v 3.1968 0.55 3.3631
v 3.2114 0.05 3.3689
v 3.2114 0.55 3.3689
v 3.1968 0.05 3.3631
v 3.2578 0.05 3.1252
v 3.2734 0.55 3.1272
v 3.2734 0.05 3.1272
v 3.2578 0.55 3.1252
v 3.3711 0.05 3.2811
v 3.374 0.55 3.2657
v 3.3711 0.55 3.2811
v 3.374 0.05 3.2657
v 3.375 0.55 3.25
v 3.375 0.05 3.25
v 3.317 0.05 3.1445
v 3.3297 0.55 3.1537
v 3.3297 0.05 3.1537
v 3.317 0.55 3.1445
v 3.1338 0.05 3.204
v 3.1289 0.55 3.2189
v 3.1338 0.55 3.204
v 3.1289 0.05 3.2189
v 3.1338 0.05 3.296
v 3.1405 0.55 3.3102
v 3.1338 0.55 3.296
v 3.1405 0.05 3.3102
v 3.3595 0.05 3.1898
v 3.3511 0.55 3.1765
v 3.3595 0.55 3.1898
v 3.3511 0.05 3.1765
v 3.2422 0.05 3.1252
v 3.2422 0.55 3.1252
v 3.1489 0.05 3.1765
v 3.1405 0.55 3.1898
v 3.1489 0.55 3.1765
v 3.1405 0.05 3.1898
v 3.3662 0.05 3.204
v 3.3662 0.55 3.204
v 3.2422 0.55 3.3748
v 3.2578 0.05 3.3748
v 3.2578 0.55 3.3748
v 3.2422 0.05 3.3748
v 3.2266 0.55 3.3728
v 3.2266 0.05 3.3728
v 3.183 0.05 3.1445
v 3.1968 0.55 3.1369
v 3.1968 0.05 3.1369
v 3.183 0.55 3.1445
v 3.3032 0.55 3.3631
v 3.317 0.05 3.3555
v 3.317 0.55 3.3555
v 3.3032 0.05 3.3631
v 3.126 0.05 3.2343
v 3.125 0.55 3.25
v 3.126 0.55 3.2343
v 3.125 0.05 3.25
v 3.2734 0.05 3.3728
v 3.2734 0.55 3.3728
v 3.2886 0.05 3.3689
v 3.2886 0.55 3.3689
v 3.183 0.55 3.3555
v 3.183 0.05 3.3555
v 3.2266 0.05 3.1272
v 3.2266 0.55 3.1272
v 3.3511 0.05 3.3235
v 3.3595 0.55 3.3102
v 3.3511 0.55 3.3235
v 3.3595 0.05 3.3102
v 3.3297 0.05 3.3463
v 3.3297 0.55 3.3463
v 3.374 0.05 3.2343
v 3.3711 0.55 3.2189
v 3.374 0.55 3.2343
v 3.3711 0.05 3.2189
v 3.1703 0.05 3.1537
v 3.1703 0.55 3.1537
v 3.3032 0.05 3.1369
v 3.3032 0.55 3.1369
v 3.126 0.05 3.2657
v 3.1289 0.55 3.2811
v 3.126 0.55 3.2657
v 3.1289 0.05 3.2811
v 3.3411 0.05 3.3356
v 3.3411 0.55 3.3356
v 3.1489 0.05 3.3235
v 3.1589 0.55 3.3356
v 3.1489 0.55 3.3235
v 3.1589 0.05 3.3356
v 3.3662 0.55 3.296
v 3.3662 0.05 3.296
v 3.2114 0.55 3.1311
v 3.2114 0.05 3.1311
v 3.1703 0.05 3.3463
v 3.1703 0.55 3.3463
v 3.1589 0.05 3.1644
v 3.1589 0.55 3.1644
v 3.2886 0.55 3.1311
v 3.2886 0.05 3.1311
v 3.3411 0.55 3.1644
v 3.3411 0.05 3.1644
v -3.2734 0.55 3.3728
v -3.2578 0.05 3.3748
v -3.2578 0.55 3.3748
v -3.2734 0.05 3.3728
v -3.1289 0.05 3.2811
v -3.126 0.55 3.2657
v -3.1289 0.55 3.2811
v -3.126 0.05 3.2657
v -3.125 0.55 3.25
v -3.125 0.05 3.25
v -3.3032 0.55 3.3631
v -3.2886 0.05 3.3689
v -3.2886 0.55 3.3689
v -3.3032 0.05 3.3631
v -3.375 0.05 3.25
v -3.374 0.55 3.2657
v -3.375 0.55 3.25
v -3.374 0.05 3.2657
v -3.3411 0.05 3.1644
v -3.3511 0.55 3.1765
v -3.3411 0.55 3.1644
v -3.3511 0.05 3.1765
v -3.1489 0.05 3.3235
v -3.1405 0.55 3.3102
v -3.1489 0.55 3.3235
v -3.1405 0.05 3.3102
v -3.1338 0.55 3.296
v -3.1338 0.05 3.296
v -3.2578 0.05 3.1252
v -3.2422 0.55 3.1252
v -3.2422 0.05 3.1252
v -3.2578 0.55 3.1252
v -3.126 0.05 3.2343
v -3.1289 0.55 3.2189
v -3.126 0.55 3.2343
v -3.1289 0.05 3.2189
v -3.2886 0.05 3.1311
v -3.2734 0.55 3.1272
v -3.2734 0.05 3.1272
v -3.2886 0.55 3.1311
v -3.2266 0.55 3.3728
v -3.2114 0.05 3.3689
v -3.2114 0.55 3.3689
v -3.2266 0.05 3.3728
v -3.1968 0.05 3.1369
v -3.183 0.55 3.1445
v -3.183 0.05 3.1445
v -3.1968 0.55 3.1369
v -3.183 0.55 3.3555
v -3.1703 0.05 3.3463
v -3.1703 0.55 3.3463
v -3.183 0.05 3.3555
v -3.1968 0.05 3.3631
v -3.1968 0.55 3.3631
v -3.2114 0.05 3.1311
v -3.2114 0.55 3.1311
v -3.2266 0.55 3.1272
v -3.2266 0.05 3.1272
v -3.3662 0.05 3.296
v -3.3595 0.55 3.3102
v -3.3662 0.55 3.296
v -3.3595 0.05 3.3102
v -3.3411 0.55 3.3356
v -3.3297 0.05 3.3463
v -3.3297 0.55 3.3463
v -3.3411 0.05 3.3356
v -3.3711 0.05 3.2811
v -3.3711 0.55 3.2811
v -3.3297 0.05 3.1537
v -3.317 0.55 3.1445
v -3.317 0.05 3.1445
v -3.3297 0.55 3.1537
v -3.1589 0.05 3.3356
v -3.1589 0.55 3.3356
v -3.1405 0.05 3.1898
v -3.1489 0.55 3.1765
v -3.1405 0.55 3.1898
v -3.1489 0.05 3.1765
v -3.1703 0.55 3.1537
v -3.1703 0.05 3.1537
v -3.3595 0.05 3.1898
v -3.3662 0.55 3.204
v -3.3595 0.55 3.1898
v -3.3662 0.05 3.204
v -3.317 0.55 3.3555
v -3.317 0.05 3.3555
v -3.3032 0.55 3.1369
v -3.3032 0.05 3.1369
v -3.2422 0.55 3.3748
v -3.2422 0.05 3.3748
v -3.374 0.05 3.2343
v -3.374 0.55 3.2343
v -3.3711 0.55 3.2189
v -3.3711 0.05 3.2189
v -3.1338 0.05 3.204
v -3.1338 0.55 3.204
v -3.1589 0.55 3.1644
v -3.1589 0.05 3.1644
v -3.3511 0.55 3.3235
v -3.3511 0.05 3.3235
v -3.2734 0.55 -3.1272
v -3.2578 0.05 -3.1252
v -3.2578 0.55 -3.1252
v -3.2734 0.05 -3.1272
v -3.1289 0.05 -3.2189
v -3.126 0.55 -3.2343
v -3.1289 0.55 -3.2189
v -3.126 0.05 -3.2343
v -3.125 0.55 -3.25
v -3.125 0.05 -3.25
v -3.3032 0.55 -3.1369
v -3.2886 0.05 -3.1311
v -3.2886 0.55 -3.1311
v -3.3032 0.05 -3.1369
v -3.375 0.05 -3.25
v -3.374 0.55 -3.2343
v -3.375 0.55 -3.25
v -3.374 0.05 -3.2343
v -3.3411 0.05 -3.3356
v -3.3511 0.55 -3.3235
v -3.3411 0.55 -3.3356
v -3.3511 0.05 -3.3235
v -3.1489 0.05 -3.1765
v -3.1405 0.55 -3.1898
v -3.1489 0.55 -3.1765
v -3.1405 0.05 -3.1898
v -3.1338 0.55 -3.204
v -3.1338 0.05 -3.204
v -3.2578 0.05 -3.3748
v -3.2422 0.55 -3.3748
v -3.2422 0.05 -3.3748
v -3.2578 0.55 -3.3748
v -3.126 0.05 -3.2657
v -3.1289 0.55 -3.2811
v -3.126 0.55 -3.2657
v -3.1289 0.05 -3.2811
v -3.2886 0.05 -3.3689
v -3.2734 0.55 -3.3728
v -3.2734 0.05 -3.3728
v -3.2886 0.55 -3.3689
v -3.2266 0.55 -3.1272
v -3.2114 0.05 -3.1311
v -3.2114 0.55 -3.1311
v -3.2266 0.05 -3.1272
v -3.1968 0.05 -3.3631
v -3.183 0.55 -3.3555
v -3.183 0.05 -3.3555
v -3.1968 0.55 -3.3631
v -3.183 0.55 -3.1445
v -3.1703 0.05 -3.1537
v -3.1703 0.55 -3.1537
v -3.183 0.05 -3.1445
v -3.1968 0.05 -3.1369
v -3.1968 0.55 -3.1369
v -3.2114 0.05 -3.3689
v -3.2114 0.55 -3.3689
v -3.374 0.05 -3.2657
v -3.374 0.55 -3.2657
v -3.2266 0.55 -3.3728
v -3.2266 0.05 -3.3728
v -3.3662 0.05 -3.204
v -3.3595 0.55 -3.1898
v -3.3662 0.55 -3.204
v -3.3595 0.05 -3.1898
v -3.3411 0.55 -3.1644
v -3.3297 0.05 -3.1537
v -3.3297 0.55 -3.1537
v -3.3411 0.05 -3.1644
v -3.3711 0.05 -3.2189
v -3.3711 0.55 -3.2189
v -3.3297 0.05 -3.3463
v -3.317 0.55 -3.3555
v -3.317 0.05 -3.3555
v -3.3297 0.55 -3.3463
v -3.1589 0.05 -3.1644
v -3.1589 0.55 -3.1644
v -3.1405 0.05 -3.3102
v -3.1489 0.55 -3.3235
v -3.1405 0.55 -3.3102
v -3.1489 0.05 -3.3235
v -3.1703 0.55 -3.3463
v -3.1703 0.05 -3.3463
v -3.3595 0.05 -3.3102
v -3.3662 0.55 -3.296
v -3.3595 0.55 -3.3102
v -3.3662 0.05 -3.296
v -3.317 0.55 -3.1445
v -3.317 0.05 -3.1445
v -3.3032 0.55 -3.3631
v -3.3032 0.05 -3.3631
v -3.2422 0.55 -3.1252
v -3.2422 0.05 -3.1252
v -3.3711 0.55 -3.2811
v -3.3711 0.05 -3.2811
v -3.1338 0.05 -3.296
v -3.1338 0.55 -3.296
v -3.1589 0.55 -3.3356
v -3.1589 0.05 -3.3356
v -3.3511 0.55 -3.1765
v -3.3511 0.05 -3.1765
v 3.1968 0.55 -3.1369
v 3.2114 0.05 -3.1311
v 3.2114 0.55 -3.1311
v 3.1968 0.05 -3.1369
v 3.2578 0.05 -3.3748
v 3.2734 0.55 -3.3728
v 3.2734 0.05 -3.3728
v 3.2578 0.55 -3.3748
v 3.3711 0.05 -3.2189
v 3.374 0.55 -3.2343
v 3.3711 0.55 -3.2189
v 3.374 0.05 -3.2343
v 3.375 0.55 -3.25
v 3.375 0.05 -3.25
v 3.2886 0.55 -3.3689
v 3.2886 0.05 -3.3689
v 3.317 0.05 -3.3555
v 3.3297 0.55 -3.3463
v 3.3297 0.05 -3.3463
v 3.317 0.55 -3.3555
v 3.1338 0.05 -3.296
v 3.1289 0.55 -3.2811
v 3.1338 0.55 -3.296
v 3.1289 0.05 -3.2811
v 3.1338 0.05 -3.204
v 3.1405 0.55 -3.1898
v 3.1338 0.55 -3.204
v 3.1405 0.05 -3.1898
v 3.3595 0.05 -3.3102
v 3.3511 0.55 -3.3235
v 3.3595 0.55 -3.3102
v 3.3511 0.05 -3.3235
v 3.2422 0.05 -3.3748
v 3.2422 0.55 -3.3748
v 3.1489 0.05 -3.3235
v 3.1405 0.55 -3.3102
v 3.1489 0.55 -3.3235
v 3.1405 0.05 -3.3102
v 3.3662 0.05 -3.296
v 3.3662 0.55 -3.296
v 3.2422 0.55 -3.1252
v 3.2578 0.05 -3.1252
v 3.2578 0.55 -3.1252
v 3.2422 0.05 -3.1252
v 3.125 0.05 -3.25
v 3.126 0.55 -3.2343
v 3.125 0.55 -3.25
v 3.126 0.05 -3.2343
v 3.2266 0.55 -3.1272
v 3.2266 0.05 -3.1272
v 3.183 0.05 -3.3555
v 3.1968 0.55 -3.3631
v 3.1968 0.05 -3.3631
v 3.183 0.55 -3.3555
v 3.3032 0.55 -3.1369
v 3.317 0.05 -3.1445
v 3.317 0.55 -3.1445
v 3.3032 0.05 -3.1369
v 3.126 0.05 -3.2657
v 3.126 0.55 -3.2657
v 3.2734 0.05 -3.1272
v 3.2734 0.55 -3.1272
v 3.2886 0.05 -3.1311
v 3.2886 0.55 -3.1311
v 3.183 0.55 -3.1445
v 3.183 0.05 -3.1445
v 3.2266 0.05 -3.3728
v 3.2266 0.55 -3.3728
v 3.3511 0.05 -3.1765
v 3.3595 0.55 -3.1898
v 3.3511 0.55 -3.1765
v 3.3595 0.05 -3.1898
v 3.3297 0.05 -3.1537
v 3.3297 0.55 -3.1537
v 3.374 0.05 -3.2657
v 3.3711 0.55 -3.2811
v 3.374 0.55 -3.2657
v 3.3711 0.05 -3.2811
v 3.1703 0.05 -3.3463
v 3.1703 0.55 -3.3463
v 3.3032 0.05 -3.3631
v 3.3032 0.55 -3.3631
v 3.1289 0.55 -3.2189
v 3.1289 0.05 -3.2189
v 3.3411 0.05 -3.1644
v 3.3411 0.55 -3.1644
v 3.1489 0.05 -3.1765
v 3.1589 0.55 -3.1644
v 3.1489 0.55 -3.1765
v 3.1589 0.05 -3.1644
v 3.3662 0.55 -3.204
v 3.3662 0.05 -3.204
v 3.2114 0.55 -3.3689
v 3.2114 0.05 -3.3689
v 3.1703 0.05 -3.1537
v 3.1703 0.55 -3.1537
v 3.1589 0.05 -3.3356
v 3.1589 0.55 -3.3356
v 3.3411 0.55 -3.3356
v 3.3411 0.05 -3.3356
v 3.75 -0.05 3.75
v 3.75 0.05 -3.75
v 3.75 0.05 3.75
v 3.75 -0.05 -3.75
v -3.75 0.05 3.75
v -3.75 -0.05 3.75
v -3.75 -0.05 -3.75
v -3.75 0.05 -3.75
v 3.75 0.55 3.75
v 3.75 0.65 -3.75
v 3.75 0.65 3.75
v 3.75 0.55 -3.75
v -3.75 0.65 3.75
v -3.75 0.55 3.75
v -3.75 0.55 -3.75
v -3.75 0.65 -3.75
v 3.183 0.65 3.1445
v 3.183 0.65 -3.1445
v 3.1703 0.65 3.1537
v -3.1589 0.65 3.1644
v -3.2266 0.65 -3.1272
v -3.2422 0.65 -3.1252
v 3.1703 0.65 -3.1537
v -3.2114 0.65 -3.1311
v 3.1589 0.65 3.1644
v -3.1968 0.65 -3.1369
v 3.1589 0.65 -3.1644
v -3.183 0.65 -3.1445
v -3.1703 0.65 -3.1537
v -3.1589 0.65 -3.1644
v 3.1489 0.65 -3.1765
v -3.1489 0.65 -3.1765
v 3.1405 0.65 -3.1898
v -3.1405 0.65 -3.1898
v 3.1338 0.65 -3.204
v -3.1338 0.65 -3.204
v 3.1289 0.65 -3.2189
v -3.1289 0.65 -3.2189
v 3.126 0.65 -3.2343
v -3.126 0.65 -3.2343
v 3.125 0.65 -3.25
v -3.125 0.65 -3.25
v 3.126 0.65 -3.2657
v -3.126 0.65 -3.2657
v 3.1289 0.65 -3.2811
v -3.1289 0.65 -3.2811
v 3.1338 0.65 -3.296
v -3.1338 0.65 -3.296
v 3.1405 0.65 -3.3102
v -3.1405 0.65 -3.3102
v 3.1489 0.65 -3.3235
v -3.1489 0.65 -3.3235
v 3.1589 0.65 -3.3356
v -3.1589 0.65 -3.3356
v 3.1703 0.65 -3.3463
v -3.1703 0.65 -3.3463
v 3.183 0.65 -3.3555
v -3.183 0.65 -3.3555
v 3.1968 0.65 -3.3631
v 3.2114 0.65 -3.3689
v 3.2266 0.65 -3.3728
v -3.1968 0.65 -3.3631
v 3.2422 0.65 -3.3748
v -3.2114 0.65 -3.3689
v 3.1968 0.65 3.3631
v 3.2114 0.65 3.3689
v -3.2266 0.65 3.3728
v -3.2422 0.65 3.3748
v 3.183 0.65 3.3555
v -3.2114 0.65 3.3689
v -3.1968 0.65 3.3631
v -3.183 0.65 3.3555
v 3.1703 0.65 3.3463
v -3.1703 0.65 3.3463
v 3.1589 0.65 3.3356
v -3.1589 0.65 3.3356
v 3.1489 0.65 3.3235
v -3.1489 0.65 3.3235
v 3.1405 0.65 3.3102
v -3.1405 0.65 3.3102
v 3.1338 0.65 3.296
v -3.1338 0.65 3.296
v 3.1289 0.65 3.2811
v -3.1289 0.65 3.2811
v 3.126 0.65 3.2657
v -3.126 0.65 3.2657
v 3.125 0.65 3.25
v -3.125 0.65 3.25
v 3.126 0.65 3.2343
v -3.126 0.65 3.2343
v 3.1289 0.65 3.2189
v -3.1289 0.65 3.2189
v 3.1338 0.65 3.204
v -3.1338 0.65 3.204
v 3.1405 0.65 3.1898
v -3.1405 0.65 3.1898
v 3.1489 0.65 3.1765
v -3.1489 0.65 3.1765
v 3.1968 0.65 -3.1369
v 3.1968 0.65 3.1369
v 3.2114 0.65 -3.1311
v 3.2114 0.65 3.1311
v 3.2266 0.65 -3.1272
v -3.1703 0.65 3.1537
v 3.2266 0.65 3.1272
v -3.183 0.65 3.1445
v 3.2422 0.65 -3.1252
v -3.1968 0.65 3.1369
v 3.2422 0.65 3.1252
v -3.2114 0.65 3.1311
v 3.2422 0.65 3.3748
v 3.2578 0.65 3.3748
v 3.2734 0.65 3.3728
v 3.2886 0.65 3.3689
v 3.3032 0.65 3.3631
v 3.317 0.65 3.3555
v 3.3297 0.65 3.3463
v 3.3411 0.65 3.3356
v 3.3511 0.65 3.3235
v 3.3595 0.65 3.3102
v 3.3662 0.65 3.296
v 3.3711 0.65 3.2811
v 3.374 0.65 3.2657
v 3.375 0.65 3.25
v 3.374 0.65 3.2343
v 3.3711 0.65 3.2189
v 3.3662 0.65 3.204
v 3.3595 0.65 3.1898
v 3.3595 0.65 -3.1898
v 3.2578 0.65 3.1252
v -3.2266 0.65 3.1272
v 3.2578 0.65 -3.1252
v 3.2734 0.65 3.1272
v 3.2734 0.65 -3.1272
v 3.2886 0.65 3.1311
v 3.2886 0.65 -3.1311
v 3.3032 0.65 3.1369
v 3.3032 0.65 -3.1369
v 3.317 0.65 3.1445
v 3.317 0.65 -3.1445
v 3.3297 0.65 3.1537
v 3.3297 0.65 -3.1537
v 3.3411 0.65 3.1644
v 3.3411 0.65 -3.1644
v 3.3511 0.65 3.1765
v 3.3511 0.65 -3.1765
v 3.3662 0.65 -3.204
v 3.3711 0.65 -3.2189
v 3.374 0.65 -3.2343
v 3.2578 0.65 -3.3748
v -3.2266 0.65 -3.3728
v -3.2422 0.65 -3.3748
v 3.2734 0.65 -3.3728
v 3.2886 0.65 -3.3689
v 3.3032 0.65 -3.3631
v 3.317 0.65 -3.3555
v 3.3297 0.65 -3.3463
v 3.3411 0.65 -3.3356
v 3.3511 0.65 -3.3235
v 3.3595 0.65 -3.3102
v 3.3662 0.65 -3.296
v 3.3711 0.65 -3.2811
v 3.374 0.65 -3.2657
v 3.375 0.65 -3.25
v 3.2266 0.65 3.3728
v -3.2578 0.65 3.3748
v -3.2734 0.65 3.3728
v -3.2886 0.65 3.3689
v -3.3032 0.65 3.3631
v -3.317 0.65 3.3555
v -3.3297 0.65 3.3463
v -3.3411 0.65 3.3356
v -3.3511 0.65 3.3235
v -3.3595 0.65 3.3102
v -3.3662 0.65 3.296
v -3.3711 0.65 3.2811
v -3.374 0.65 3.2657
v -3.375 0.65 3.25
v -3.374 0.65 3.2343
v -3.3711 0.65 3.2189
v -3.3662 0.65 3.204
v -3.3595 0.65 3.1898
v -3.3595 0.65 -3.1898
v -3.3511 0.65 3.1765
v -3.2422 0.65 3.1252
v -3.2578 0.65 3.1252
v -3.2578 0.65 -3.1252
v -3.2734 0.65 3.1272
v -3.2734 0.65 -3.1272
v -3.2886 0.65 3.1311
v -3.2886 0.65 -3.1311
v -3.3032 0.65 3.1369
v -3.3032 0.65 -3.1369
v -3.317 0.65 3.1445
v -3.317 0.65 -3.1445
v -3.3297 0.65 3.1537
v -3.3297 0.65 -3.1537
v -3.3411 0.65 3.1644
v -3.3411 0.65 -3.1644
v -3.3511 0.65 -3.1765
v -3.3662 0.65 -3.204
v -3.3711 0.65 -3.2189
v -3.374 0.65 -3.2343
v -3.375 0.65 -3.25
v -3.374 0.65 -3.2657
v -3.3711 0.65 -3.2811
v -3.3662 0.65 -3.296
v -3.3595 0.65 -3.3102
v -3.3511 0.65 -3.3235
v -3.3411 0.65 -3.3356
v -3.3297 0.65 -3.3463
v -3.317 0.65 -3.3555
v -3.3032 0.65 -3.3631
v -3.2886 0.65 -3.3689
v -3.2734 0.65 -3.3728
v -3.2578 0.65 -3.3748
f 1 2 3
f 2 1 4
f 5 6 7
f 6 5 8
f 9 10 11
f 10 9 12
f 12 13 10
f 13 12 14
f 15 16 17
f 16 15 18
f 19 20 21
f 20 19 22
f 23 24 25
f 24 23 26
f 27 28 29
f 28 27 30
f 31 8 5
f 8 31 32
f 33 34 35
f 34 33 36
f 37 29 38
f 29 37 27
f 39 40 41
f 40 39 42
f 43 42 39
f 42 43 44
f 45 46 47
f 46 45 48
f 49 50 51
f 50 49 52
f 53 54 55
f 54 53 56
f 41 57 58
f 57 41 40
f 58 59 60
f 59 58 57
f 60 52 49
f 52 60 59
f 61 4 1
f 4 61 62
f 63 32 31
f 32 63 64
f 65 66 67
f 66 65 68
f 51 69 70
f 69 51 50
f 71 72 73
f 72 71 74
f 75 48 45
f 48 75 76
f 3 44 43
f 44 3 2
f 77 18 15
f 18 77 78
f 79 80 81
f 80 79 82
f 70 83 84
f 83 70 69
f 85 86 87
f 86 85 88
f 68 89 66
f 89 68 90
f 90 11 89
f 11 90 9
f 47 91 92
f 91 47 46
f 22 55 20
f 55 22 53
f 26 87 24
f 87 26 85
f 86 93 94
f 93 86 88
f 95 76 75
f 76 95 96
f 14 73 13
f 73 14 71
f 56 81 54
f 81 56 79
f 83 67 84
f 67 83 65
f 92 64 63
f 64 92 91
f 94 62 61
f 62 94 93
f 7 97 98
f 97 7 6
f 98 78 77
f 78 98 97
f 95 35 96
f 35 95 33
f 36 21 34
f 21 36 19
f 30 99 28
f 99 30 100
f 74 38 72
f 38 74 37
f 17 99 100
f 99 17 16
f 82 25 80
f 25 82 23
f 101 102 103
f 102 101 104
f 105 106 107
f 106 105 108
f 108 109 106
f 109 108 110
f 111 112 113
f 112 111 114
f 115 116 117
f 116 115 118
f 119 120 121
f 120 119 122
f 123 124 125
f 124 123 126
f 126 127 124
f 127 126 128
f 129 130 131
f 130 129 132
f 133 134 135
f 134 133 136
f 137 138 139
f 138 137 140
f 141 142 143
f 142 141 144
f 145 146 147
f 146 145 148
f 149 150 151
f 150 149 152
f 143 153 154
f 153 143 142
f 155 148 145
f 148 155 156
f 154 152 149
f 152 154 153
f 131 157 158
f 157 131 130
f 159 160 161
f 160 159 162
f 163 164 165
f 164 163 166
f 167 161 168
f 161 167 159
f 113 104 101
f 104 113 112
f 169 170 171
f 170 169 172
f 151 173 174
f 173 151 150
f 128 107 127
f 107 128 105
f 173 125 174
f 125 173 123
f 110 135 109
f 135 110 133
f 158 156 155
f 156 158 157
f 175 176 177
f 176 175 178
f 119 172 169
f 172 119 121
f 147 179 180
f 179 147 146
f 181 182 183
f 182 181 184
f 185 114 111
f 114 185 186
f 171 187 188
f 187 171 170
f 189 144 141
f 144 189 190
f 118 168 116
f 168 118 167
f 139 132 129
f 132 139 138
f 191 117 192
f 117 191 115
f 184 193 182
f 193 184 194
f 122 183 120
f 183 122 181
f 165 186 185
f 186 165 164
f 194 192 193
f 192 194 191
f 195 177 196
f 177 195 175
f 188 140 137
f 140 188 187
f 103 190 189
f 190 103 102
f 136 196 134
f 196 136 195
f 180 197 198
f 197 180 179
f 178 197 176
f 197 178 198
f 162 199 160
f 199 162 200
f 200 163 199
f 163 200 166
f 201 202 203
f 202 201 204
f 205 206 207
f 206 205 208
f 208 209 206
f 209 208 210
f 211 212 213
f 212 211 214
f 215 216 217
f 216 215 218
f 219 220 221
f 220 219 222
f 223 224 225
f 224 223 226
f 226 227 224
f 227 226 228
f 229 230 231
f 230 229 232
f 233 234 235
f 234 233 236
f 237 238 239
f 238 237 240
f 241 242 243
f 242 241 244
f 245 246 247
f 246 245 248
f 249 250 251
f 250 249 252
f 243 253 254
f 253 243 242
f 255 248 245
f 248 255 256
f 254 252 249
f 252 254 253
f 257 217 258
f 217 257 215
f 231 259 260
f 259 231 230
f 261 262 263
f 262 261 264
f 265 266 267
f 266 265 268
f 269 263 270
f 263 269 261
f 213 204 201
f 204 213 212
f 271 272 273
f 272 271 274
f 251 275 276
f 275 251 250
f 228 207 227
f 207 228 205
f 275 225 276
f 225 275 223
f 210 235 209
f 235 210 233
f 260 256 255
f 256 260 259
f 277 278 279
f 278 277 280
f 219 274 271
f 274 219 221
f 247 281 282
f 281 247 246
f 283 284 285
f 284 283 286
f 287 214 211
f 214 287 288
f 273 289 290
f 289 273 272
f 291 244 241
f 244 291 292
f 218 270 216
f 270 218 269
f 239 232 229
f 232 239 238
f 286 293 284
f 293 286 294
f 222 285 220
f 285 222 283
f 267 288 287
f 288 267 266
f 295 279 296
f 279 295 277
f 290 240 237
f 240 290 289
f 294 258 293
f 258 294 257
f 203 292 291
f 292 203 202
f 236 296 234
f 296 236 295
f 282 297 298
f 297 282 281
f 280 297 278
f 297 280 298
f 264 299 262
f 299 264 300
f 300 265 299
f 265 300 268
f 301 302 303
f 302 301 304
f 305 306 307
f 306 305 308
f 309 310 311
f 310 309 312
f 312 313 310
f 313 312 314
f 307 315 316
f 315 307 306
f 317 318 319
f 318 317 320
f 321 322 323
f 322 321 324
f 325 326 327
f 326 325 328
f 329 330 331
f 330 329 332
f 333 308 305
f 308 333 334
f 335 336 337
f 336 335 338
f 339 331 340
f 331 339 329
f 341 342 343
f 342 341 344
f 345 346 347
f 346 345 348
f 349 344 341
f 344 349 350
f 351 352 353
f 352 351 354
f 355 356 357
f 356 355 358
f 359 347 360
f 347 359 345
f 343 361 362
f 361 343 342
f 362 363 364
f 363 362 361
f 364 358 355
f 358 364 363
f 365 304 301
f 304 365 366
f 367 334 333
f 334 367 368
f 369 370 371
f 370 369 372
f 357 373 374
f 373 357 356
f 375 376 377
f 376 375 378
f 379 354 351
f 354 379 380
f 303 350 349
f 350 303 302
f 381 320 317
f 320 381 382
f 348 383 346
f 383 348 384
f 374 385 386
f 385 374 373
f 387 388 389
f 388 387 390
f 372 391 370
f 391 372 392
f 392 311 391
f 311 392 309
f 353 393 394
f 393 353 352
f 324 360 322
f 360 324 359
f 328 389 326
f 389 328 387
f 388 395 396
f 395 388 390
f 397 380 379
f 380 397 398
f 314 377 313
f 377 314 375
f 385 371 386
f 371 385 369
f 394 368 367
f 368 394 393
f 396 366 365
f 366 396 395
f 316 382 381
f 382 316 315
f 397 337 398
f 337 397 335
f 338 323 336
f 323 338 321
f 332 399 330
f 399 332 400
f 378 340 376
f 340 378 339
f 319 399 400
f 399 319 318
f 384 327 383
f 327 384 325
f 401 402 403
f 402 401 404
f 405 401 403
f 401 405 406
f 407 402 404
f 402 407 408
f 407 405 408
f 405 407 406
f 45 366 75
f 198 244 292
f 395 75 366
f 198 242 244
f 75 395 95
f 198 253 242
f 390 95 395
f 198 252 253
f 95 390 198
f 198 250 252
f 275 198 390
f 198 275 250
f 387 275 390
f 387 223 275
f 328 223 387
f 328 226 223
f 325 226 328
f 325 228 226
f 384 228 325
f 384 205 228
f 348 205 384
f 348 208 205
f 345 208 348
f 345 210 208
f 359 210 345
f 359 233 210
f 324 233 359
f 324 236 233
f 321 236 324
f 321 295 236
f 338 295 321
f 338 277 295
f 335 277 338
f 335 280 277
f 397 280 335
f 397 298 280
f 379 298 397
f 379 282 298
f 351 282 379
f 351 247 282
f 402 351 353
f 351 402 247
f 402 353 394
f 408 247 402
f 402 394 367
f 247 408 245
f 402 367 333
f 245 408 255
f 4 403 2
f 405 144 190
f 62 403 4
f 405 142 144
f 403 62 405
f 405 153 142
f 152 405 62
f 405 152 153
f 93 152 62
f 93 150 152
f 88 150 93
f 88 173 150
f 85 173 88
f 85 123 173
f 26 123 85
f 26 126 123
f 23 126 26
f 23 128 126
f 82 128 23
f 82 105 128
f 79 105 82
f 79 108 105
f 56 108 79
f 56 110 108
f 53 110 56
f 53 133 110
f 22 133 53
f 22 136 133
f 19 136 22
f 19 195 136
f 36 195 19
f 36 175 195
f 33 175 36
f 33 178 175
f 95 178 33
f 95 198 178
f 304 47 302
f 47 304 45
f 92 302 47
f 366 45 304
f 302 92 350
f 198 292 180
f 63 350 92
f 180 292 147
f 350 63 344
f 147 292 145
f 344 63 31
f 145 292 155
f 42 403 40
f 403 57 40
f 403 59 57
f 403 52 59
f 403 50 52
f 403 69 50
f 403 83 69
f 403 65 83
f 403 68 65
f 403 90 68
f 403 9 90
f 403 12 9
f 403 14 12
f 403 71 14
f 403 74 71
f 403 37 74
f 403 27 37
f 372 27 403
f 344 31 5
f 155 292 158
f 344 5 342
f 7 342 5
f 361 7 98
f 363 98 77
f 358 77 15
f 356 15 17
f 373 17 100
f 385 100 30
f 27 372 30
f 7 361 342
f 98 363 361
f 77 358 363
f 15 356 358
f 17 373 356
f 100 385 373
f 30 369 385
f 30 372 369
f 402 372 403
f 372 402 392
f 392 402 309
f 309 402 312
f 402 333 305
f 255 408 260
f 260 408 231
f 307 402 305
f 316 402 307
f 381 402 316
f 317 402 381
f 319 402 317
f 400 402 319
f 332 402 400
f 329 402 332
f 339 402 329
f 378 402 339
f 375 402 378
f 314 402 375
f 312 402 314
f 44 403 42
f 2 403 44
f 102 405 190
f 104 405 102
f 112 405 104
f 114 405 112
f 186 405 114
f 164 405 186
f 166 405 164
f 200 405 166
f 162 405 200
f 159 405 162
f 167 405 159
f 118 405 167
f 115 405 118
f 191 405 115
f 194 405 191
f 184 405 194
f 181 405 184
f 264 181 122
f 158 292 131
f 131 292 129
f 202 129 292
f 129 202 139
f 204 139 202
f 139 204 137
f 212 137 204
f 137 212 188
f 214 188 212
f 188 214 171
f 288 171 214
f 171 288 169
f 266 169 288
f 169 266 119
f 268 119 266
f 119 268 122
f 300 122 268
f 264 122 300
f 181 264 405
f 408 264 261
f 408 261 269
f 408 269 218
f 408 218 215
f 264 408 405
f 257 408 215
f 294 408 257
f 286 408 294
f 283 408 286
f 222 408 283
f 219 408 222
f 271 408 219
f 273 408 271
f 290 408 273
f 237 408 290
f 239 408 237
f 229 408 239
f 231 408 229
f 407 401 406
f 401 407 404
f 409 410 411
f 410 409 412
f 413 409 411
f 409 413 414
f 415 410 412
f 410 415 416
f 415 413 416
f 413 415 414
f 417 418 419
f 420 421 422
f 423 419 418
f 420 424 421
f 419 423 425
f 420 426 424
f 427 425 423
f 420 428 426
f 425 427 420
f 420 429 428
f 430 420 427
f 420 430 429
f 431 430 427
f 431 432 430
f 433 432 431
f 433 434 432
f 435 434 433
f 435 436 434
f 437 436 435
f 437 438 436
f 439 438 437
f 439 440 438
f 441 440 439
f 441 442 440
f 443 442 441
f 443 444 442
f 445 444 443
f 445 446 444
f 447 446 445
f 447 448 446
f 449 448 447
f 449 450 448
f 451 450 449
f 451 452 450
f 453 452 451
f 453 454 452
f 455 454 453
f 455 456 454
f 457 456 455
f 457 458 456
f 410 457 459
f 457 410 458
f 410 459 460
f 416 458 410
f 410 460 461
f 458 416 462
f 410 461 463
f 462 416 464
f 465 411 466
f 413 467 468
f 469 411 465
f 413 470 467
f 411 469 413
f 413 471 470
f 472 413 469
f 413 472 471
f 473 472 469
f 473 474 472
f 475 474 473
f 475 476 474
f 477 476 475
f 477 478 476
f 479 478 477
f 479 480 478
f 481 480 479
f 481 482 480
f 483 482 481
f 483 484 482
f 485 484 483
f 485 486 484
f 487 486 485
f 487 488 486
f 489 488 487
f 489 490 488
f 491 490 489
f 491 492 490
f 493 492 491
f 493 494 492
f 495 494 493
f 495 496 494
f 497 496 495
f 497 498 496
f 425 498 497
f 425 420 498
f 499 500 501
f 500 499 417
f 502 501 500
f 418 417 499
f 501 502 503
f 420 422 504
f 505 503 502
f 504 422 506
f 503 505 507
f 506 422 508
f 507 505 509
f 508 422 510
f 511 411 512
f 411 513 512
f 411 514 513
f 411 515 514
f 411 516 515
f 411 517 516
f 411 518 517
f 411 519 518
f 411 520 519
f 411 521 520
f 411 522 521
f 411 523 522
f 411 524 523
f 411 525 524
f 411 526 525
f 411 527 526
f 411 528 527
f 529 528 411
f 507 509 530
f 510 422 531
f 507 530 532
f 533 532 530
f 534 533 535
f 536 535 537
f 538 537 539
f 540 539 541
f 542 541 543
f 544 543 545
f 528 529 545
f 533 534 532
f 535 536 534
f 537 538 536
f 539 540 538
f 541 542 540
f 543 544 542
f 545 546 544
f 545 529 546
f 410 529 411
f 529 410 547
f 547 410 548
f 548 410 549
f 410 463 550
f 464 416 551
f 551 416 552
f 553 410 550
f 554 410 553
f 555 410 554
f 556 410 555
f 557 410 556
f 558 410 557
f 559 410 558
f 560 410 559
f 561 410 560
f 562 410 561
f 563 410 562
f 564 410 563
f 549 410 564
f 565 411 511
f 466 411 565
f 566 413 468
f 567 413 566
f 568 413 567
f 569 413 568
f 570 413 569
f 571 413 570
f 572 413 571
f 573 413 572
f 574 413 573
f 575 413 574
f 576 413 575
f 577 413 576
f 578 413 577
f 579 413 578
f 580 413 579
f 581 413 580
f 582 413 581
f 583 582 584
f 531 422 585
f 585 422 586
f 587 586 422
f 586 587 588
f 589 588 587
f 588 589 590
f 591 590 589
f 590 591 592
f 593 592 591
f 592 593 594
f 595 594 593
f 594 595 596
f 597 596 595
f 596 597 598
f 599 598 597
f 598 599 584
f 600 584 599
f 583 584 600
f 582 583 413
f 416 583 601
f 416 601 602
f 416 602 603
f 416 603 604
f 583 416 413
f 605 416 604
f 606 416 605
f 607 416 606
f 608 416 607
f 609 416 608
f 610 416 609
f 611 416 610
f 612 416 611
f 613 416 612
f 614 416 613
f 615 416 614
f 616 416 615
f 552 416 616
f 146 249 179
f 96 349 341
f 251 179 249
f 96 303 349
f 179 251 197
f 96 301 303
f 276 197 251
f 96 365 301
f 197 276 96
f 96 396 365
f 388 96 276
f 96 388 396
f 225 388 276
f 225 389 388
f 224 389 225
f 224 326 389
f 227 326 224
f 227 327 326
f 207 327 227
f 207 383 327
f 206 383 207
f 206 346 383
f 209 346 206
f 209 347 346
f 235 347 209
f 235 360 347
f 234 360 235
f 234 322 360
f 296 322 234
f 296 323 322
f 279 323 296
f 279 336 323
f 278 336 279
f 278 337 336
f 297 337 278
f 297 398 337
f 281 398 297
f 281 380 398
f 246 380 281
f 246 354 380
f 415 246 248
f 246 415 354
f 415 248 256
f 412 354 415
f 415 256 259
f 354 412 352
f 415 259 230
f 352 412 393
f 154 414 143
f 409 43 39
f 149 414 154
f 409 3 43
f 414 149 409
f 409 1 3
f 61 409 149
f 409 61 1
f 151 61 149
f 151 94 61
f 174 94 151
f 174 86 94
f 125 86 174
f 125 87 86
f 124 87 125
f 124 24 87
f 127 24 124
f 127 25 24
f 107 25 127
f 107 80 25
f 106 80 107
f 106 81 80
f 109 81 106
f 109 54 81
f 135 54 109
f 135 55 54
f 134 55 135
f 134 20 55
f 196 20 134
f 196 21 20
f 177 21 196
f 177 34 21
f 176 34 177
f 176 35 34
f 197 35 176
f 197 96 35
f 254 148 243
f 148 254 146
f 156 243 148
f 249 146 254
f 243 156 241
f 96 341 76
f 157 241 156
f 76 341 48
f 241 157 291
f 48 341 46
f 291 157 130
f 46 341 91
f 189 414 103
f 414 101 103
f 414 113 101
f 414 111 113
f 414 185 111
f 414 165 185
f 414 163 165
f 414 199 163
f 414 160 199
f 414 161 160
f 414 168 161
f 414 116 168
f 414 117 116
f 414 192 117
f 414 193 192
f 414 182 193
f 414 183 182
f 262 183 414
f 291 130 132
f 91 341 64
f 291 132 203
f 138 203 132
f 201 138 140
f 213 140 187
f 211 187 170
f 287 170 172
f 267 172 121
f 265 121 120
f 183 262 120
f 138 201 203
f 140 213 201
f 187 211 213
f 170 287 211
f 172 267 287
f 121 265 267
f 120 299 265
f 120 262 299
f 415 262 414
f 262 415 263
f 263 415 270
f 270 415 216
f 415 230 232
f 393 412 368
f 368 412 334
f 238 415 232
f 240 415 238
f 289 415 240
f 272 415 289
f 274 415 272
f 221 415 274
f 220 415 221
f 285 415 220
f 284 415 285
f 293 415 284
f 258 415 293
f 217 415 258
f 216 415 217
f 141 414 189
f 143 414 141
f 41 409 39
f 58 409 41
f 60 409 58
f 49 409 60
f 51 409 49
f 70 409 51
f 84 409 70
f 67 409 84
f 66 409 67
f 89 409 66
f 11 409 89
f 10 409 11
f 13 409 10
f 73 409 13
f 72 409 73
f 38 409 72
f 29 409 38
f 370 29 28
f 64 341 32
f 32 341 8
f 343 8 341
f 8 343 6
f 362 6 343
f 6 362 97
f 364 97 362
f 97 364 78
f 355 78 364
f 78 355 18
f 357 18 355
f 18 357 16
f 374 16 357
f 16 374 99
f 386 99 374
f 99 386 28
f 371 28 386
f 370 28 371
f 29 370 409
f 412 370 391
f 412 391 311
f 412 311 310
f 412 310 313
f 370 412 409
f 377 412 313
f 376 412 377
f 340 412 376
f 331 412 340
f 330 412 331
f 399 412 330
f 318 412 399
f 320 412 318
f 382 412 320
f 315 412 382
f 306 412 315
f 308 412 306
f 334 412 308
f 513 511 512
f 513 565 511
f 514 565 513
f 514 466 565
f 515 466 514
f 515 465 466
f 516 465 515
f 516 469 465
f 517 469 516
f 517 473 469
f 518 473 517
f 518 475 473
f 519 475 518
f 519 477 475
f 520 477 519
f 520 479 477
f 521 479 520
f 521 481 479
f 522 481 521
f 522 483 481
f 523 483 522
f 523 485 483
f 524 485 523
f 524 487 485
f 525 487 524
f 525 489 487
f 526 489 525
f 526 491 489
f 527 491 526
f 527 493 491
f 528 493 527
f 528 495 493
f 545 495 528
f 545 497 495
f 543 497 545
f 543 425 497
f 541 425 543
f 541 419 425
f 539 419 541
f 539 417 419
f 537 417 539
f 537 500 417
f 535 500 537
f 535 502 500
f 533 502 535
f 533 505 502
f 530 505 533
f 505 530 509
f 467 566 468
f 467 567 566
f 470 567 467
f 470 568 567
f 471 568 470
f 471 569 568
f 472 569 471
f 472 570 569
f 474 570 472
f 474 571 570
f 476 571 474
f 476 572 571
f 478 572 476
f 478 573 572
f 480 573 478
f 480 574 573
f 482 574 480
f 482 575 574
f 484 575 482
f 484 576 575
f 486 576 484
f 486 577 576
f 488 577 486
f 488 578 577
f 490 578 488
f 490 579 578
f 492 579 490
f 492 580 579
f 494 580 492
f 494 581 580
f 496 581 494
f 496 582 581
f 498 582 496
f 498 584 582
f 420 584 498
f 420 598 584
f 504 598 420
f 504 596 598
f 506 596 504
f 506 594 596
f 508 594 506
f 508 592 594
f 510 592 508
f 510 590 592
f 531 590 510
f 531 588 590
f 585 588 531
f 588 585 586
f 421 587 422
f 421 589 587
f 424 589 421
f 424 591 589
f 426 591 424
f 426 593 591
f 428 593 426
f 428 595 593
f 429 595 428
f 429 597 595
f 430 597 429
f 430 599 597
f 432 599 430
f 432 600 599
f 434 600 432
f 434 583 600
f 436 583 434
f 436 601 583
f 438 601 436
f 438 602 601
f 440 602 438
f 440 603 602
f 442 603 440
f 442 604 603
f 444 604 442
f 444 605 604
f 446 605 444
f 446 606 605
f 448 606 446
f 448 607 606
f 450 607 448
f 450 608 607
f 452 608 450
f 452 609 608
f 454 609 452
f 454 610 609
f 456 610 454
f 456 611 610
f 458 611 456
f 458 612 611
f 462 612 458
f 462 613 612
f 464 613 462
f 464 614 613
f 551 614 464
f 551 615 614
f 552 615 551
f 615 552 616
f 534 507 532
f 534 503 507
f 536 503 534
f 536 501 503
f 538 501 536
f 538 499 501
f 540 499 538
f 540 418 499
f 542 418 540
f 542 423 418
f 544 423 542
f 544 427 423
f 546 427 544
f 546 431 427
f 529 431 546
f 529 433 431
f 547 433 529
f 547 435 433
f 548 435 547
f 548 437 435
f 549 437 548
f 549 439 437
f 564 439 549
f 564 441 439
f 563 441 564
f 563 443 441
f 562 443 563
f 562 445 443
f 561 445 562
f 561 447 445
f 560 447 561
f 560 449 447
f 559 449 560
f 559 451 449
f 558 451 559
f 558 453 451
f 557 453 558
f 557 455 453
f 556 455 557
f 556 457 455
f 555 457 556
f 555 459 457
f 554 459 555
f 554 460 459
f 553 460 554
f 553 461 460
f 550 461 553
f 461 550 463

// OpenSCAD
$fn = 50;

HEIGHT = 7.5;
WIDTH = 7.5;
THICKNESS = 0.1;
INSET = 0.5;
GAP_DISTANCE = 0.5;
HOLE_SIZE = 0.125;

module hole(delta) {
  translate(delta)
    rotate(90, [1, 0, 0])
      color("blue") {
        cylinder(THICKNESS + 0.1, r = HOLE_SIZE, center = true);
      }
}

module board(delta) {
  translate(delta)
    difference() {
      color("yellow")
        cube([WIDTH, THICKNESS, HEIGHT], center = true);
      union() {
        hole([WIDTH / 2 - INSET, 0, HEIGHT / 2 - INSET]);
        hole([-WIDTH / 2 + INSET, 0, HEIGHT / 2 - INSET]);
        hole([-WIDTH / 2 + INSET, 0, -HEIGHT / 2 + INSET]);
        hole([WIDTH / 2 - INSET, 0, -HEIGHT / 2 + INSET]);
      }
    }
}

module screw(delta) {
  translate(delta)
    translate([0, (GAP_DISTANCE + THICKNESS)/2, 0])
      rotate(90, [1, 0, 0])
        color("red")
          cylinder(THICKNESS * 2 + GAP_DISTANCE, r = HOLE_SIZE, center = true);
}

board([0,0,0]);
board([0,GAP_DISTANCE + THICKNESS,0]);

screw([WIDTH / 2 - INSET, 0, HEIGHT / 2 - INSET]);
screw([-WIDTH / 2 + INSET, 0, HEIGHT / 2 - INSET]);
screw([-WIDTH / 2 + INSET, 0, -HEIGHT / 2 + INSET]);
screw([WIDTH / 2 - INSET, 0, -HEIGHT / 2 + INSET]);
